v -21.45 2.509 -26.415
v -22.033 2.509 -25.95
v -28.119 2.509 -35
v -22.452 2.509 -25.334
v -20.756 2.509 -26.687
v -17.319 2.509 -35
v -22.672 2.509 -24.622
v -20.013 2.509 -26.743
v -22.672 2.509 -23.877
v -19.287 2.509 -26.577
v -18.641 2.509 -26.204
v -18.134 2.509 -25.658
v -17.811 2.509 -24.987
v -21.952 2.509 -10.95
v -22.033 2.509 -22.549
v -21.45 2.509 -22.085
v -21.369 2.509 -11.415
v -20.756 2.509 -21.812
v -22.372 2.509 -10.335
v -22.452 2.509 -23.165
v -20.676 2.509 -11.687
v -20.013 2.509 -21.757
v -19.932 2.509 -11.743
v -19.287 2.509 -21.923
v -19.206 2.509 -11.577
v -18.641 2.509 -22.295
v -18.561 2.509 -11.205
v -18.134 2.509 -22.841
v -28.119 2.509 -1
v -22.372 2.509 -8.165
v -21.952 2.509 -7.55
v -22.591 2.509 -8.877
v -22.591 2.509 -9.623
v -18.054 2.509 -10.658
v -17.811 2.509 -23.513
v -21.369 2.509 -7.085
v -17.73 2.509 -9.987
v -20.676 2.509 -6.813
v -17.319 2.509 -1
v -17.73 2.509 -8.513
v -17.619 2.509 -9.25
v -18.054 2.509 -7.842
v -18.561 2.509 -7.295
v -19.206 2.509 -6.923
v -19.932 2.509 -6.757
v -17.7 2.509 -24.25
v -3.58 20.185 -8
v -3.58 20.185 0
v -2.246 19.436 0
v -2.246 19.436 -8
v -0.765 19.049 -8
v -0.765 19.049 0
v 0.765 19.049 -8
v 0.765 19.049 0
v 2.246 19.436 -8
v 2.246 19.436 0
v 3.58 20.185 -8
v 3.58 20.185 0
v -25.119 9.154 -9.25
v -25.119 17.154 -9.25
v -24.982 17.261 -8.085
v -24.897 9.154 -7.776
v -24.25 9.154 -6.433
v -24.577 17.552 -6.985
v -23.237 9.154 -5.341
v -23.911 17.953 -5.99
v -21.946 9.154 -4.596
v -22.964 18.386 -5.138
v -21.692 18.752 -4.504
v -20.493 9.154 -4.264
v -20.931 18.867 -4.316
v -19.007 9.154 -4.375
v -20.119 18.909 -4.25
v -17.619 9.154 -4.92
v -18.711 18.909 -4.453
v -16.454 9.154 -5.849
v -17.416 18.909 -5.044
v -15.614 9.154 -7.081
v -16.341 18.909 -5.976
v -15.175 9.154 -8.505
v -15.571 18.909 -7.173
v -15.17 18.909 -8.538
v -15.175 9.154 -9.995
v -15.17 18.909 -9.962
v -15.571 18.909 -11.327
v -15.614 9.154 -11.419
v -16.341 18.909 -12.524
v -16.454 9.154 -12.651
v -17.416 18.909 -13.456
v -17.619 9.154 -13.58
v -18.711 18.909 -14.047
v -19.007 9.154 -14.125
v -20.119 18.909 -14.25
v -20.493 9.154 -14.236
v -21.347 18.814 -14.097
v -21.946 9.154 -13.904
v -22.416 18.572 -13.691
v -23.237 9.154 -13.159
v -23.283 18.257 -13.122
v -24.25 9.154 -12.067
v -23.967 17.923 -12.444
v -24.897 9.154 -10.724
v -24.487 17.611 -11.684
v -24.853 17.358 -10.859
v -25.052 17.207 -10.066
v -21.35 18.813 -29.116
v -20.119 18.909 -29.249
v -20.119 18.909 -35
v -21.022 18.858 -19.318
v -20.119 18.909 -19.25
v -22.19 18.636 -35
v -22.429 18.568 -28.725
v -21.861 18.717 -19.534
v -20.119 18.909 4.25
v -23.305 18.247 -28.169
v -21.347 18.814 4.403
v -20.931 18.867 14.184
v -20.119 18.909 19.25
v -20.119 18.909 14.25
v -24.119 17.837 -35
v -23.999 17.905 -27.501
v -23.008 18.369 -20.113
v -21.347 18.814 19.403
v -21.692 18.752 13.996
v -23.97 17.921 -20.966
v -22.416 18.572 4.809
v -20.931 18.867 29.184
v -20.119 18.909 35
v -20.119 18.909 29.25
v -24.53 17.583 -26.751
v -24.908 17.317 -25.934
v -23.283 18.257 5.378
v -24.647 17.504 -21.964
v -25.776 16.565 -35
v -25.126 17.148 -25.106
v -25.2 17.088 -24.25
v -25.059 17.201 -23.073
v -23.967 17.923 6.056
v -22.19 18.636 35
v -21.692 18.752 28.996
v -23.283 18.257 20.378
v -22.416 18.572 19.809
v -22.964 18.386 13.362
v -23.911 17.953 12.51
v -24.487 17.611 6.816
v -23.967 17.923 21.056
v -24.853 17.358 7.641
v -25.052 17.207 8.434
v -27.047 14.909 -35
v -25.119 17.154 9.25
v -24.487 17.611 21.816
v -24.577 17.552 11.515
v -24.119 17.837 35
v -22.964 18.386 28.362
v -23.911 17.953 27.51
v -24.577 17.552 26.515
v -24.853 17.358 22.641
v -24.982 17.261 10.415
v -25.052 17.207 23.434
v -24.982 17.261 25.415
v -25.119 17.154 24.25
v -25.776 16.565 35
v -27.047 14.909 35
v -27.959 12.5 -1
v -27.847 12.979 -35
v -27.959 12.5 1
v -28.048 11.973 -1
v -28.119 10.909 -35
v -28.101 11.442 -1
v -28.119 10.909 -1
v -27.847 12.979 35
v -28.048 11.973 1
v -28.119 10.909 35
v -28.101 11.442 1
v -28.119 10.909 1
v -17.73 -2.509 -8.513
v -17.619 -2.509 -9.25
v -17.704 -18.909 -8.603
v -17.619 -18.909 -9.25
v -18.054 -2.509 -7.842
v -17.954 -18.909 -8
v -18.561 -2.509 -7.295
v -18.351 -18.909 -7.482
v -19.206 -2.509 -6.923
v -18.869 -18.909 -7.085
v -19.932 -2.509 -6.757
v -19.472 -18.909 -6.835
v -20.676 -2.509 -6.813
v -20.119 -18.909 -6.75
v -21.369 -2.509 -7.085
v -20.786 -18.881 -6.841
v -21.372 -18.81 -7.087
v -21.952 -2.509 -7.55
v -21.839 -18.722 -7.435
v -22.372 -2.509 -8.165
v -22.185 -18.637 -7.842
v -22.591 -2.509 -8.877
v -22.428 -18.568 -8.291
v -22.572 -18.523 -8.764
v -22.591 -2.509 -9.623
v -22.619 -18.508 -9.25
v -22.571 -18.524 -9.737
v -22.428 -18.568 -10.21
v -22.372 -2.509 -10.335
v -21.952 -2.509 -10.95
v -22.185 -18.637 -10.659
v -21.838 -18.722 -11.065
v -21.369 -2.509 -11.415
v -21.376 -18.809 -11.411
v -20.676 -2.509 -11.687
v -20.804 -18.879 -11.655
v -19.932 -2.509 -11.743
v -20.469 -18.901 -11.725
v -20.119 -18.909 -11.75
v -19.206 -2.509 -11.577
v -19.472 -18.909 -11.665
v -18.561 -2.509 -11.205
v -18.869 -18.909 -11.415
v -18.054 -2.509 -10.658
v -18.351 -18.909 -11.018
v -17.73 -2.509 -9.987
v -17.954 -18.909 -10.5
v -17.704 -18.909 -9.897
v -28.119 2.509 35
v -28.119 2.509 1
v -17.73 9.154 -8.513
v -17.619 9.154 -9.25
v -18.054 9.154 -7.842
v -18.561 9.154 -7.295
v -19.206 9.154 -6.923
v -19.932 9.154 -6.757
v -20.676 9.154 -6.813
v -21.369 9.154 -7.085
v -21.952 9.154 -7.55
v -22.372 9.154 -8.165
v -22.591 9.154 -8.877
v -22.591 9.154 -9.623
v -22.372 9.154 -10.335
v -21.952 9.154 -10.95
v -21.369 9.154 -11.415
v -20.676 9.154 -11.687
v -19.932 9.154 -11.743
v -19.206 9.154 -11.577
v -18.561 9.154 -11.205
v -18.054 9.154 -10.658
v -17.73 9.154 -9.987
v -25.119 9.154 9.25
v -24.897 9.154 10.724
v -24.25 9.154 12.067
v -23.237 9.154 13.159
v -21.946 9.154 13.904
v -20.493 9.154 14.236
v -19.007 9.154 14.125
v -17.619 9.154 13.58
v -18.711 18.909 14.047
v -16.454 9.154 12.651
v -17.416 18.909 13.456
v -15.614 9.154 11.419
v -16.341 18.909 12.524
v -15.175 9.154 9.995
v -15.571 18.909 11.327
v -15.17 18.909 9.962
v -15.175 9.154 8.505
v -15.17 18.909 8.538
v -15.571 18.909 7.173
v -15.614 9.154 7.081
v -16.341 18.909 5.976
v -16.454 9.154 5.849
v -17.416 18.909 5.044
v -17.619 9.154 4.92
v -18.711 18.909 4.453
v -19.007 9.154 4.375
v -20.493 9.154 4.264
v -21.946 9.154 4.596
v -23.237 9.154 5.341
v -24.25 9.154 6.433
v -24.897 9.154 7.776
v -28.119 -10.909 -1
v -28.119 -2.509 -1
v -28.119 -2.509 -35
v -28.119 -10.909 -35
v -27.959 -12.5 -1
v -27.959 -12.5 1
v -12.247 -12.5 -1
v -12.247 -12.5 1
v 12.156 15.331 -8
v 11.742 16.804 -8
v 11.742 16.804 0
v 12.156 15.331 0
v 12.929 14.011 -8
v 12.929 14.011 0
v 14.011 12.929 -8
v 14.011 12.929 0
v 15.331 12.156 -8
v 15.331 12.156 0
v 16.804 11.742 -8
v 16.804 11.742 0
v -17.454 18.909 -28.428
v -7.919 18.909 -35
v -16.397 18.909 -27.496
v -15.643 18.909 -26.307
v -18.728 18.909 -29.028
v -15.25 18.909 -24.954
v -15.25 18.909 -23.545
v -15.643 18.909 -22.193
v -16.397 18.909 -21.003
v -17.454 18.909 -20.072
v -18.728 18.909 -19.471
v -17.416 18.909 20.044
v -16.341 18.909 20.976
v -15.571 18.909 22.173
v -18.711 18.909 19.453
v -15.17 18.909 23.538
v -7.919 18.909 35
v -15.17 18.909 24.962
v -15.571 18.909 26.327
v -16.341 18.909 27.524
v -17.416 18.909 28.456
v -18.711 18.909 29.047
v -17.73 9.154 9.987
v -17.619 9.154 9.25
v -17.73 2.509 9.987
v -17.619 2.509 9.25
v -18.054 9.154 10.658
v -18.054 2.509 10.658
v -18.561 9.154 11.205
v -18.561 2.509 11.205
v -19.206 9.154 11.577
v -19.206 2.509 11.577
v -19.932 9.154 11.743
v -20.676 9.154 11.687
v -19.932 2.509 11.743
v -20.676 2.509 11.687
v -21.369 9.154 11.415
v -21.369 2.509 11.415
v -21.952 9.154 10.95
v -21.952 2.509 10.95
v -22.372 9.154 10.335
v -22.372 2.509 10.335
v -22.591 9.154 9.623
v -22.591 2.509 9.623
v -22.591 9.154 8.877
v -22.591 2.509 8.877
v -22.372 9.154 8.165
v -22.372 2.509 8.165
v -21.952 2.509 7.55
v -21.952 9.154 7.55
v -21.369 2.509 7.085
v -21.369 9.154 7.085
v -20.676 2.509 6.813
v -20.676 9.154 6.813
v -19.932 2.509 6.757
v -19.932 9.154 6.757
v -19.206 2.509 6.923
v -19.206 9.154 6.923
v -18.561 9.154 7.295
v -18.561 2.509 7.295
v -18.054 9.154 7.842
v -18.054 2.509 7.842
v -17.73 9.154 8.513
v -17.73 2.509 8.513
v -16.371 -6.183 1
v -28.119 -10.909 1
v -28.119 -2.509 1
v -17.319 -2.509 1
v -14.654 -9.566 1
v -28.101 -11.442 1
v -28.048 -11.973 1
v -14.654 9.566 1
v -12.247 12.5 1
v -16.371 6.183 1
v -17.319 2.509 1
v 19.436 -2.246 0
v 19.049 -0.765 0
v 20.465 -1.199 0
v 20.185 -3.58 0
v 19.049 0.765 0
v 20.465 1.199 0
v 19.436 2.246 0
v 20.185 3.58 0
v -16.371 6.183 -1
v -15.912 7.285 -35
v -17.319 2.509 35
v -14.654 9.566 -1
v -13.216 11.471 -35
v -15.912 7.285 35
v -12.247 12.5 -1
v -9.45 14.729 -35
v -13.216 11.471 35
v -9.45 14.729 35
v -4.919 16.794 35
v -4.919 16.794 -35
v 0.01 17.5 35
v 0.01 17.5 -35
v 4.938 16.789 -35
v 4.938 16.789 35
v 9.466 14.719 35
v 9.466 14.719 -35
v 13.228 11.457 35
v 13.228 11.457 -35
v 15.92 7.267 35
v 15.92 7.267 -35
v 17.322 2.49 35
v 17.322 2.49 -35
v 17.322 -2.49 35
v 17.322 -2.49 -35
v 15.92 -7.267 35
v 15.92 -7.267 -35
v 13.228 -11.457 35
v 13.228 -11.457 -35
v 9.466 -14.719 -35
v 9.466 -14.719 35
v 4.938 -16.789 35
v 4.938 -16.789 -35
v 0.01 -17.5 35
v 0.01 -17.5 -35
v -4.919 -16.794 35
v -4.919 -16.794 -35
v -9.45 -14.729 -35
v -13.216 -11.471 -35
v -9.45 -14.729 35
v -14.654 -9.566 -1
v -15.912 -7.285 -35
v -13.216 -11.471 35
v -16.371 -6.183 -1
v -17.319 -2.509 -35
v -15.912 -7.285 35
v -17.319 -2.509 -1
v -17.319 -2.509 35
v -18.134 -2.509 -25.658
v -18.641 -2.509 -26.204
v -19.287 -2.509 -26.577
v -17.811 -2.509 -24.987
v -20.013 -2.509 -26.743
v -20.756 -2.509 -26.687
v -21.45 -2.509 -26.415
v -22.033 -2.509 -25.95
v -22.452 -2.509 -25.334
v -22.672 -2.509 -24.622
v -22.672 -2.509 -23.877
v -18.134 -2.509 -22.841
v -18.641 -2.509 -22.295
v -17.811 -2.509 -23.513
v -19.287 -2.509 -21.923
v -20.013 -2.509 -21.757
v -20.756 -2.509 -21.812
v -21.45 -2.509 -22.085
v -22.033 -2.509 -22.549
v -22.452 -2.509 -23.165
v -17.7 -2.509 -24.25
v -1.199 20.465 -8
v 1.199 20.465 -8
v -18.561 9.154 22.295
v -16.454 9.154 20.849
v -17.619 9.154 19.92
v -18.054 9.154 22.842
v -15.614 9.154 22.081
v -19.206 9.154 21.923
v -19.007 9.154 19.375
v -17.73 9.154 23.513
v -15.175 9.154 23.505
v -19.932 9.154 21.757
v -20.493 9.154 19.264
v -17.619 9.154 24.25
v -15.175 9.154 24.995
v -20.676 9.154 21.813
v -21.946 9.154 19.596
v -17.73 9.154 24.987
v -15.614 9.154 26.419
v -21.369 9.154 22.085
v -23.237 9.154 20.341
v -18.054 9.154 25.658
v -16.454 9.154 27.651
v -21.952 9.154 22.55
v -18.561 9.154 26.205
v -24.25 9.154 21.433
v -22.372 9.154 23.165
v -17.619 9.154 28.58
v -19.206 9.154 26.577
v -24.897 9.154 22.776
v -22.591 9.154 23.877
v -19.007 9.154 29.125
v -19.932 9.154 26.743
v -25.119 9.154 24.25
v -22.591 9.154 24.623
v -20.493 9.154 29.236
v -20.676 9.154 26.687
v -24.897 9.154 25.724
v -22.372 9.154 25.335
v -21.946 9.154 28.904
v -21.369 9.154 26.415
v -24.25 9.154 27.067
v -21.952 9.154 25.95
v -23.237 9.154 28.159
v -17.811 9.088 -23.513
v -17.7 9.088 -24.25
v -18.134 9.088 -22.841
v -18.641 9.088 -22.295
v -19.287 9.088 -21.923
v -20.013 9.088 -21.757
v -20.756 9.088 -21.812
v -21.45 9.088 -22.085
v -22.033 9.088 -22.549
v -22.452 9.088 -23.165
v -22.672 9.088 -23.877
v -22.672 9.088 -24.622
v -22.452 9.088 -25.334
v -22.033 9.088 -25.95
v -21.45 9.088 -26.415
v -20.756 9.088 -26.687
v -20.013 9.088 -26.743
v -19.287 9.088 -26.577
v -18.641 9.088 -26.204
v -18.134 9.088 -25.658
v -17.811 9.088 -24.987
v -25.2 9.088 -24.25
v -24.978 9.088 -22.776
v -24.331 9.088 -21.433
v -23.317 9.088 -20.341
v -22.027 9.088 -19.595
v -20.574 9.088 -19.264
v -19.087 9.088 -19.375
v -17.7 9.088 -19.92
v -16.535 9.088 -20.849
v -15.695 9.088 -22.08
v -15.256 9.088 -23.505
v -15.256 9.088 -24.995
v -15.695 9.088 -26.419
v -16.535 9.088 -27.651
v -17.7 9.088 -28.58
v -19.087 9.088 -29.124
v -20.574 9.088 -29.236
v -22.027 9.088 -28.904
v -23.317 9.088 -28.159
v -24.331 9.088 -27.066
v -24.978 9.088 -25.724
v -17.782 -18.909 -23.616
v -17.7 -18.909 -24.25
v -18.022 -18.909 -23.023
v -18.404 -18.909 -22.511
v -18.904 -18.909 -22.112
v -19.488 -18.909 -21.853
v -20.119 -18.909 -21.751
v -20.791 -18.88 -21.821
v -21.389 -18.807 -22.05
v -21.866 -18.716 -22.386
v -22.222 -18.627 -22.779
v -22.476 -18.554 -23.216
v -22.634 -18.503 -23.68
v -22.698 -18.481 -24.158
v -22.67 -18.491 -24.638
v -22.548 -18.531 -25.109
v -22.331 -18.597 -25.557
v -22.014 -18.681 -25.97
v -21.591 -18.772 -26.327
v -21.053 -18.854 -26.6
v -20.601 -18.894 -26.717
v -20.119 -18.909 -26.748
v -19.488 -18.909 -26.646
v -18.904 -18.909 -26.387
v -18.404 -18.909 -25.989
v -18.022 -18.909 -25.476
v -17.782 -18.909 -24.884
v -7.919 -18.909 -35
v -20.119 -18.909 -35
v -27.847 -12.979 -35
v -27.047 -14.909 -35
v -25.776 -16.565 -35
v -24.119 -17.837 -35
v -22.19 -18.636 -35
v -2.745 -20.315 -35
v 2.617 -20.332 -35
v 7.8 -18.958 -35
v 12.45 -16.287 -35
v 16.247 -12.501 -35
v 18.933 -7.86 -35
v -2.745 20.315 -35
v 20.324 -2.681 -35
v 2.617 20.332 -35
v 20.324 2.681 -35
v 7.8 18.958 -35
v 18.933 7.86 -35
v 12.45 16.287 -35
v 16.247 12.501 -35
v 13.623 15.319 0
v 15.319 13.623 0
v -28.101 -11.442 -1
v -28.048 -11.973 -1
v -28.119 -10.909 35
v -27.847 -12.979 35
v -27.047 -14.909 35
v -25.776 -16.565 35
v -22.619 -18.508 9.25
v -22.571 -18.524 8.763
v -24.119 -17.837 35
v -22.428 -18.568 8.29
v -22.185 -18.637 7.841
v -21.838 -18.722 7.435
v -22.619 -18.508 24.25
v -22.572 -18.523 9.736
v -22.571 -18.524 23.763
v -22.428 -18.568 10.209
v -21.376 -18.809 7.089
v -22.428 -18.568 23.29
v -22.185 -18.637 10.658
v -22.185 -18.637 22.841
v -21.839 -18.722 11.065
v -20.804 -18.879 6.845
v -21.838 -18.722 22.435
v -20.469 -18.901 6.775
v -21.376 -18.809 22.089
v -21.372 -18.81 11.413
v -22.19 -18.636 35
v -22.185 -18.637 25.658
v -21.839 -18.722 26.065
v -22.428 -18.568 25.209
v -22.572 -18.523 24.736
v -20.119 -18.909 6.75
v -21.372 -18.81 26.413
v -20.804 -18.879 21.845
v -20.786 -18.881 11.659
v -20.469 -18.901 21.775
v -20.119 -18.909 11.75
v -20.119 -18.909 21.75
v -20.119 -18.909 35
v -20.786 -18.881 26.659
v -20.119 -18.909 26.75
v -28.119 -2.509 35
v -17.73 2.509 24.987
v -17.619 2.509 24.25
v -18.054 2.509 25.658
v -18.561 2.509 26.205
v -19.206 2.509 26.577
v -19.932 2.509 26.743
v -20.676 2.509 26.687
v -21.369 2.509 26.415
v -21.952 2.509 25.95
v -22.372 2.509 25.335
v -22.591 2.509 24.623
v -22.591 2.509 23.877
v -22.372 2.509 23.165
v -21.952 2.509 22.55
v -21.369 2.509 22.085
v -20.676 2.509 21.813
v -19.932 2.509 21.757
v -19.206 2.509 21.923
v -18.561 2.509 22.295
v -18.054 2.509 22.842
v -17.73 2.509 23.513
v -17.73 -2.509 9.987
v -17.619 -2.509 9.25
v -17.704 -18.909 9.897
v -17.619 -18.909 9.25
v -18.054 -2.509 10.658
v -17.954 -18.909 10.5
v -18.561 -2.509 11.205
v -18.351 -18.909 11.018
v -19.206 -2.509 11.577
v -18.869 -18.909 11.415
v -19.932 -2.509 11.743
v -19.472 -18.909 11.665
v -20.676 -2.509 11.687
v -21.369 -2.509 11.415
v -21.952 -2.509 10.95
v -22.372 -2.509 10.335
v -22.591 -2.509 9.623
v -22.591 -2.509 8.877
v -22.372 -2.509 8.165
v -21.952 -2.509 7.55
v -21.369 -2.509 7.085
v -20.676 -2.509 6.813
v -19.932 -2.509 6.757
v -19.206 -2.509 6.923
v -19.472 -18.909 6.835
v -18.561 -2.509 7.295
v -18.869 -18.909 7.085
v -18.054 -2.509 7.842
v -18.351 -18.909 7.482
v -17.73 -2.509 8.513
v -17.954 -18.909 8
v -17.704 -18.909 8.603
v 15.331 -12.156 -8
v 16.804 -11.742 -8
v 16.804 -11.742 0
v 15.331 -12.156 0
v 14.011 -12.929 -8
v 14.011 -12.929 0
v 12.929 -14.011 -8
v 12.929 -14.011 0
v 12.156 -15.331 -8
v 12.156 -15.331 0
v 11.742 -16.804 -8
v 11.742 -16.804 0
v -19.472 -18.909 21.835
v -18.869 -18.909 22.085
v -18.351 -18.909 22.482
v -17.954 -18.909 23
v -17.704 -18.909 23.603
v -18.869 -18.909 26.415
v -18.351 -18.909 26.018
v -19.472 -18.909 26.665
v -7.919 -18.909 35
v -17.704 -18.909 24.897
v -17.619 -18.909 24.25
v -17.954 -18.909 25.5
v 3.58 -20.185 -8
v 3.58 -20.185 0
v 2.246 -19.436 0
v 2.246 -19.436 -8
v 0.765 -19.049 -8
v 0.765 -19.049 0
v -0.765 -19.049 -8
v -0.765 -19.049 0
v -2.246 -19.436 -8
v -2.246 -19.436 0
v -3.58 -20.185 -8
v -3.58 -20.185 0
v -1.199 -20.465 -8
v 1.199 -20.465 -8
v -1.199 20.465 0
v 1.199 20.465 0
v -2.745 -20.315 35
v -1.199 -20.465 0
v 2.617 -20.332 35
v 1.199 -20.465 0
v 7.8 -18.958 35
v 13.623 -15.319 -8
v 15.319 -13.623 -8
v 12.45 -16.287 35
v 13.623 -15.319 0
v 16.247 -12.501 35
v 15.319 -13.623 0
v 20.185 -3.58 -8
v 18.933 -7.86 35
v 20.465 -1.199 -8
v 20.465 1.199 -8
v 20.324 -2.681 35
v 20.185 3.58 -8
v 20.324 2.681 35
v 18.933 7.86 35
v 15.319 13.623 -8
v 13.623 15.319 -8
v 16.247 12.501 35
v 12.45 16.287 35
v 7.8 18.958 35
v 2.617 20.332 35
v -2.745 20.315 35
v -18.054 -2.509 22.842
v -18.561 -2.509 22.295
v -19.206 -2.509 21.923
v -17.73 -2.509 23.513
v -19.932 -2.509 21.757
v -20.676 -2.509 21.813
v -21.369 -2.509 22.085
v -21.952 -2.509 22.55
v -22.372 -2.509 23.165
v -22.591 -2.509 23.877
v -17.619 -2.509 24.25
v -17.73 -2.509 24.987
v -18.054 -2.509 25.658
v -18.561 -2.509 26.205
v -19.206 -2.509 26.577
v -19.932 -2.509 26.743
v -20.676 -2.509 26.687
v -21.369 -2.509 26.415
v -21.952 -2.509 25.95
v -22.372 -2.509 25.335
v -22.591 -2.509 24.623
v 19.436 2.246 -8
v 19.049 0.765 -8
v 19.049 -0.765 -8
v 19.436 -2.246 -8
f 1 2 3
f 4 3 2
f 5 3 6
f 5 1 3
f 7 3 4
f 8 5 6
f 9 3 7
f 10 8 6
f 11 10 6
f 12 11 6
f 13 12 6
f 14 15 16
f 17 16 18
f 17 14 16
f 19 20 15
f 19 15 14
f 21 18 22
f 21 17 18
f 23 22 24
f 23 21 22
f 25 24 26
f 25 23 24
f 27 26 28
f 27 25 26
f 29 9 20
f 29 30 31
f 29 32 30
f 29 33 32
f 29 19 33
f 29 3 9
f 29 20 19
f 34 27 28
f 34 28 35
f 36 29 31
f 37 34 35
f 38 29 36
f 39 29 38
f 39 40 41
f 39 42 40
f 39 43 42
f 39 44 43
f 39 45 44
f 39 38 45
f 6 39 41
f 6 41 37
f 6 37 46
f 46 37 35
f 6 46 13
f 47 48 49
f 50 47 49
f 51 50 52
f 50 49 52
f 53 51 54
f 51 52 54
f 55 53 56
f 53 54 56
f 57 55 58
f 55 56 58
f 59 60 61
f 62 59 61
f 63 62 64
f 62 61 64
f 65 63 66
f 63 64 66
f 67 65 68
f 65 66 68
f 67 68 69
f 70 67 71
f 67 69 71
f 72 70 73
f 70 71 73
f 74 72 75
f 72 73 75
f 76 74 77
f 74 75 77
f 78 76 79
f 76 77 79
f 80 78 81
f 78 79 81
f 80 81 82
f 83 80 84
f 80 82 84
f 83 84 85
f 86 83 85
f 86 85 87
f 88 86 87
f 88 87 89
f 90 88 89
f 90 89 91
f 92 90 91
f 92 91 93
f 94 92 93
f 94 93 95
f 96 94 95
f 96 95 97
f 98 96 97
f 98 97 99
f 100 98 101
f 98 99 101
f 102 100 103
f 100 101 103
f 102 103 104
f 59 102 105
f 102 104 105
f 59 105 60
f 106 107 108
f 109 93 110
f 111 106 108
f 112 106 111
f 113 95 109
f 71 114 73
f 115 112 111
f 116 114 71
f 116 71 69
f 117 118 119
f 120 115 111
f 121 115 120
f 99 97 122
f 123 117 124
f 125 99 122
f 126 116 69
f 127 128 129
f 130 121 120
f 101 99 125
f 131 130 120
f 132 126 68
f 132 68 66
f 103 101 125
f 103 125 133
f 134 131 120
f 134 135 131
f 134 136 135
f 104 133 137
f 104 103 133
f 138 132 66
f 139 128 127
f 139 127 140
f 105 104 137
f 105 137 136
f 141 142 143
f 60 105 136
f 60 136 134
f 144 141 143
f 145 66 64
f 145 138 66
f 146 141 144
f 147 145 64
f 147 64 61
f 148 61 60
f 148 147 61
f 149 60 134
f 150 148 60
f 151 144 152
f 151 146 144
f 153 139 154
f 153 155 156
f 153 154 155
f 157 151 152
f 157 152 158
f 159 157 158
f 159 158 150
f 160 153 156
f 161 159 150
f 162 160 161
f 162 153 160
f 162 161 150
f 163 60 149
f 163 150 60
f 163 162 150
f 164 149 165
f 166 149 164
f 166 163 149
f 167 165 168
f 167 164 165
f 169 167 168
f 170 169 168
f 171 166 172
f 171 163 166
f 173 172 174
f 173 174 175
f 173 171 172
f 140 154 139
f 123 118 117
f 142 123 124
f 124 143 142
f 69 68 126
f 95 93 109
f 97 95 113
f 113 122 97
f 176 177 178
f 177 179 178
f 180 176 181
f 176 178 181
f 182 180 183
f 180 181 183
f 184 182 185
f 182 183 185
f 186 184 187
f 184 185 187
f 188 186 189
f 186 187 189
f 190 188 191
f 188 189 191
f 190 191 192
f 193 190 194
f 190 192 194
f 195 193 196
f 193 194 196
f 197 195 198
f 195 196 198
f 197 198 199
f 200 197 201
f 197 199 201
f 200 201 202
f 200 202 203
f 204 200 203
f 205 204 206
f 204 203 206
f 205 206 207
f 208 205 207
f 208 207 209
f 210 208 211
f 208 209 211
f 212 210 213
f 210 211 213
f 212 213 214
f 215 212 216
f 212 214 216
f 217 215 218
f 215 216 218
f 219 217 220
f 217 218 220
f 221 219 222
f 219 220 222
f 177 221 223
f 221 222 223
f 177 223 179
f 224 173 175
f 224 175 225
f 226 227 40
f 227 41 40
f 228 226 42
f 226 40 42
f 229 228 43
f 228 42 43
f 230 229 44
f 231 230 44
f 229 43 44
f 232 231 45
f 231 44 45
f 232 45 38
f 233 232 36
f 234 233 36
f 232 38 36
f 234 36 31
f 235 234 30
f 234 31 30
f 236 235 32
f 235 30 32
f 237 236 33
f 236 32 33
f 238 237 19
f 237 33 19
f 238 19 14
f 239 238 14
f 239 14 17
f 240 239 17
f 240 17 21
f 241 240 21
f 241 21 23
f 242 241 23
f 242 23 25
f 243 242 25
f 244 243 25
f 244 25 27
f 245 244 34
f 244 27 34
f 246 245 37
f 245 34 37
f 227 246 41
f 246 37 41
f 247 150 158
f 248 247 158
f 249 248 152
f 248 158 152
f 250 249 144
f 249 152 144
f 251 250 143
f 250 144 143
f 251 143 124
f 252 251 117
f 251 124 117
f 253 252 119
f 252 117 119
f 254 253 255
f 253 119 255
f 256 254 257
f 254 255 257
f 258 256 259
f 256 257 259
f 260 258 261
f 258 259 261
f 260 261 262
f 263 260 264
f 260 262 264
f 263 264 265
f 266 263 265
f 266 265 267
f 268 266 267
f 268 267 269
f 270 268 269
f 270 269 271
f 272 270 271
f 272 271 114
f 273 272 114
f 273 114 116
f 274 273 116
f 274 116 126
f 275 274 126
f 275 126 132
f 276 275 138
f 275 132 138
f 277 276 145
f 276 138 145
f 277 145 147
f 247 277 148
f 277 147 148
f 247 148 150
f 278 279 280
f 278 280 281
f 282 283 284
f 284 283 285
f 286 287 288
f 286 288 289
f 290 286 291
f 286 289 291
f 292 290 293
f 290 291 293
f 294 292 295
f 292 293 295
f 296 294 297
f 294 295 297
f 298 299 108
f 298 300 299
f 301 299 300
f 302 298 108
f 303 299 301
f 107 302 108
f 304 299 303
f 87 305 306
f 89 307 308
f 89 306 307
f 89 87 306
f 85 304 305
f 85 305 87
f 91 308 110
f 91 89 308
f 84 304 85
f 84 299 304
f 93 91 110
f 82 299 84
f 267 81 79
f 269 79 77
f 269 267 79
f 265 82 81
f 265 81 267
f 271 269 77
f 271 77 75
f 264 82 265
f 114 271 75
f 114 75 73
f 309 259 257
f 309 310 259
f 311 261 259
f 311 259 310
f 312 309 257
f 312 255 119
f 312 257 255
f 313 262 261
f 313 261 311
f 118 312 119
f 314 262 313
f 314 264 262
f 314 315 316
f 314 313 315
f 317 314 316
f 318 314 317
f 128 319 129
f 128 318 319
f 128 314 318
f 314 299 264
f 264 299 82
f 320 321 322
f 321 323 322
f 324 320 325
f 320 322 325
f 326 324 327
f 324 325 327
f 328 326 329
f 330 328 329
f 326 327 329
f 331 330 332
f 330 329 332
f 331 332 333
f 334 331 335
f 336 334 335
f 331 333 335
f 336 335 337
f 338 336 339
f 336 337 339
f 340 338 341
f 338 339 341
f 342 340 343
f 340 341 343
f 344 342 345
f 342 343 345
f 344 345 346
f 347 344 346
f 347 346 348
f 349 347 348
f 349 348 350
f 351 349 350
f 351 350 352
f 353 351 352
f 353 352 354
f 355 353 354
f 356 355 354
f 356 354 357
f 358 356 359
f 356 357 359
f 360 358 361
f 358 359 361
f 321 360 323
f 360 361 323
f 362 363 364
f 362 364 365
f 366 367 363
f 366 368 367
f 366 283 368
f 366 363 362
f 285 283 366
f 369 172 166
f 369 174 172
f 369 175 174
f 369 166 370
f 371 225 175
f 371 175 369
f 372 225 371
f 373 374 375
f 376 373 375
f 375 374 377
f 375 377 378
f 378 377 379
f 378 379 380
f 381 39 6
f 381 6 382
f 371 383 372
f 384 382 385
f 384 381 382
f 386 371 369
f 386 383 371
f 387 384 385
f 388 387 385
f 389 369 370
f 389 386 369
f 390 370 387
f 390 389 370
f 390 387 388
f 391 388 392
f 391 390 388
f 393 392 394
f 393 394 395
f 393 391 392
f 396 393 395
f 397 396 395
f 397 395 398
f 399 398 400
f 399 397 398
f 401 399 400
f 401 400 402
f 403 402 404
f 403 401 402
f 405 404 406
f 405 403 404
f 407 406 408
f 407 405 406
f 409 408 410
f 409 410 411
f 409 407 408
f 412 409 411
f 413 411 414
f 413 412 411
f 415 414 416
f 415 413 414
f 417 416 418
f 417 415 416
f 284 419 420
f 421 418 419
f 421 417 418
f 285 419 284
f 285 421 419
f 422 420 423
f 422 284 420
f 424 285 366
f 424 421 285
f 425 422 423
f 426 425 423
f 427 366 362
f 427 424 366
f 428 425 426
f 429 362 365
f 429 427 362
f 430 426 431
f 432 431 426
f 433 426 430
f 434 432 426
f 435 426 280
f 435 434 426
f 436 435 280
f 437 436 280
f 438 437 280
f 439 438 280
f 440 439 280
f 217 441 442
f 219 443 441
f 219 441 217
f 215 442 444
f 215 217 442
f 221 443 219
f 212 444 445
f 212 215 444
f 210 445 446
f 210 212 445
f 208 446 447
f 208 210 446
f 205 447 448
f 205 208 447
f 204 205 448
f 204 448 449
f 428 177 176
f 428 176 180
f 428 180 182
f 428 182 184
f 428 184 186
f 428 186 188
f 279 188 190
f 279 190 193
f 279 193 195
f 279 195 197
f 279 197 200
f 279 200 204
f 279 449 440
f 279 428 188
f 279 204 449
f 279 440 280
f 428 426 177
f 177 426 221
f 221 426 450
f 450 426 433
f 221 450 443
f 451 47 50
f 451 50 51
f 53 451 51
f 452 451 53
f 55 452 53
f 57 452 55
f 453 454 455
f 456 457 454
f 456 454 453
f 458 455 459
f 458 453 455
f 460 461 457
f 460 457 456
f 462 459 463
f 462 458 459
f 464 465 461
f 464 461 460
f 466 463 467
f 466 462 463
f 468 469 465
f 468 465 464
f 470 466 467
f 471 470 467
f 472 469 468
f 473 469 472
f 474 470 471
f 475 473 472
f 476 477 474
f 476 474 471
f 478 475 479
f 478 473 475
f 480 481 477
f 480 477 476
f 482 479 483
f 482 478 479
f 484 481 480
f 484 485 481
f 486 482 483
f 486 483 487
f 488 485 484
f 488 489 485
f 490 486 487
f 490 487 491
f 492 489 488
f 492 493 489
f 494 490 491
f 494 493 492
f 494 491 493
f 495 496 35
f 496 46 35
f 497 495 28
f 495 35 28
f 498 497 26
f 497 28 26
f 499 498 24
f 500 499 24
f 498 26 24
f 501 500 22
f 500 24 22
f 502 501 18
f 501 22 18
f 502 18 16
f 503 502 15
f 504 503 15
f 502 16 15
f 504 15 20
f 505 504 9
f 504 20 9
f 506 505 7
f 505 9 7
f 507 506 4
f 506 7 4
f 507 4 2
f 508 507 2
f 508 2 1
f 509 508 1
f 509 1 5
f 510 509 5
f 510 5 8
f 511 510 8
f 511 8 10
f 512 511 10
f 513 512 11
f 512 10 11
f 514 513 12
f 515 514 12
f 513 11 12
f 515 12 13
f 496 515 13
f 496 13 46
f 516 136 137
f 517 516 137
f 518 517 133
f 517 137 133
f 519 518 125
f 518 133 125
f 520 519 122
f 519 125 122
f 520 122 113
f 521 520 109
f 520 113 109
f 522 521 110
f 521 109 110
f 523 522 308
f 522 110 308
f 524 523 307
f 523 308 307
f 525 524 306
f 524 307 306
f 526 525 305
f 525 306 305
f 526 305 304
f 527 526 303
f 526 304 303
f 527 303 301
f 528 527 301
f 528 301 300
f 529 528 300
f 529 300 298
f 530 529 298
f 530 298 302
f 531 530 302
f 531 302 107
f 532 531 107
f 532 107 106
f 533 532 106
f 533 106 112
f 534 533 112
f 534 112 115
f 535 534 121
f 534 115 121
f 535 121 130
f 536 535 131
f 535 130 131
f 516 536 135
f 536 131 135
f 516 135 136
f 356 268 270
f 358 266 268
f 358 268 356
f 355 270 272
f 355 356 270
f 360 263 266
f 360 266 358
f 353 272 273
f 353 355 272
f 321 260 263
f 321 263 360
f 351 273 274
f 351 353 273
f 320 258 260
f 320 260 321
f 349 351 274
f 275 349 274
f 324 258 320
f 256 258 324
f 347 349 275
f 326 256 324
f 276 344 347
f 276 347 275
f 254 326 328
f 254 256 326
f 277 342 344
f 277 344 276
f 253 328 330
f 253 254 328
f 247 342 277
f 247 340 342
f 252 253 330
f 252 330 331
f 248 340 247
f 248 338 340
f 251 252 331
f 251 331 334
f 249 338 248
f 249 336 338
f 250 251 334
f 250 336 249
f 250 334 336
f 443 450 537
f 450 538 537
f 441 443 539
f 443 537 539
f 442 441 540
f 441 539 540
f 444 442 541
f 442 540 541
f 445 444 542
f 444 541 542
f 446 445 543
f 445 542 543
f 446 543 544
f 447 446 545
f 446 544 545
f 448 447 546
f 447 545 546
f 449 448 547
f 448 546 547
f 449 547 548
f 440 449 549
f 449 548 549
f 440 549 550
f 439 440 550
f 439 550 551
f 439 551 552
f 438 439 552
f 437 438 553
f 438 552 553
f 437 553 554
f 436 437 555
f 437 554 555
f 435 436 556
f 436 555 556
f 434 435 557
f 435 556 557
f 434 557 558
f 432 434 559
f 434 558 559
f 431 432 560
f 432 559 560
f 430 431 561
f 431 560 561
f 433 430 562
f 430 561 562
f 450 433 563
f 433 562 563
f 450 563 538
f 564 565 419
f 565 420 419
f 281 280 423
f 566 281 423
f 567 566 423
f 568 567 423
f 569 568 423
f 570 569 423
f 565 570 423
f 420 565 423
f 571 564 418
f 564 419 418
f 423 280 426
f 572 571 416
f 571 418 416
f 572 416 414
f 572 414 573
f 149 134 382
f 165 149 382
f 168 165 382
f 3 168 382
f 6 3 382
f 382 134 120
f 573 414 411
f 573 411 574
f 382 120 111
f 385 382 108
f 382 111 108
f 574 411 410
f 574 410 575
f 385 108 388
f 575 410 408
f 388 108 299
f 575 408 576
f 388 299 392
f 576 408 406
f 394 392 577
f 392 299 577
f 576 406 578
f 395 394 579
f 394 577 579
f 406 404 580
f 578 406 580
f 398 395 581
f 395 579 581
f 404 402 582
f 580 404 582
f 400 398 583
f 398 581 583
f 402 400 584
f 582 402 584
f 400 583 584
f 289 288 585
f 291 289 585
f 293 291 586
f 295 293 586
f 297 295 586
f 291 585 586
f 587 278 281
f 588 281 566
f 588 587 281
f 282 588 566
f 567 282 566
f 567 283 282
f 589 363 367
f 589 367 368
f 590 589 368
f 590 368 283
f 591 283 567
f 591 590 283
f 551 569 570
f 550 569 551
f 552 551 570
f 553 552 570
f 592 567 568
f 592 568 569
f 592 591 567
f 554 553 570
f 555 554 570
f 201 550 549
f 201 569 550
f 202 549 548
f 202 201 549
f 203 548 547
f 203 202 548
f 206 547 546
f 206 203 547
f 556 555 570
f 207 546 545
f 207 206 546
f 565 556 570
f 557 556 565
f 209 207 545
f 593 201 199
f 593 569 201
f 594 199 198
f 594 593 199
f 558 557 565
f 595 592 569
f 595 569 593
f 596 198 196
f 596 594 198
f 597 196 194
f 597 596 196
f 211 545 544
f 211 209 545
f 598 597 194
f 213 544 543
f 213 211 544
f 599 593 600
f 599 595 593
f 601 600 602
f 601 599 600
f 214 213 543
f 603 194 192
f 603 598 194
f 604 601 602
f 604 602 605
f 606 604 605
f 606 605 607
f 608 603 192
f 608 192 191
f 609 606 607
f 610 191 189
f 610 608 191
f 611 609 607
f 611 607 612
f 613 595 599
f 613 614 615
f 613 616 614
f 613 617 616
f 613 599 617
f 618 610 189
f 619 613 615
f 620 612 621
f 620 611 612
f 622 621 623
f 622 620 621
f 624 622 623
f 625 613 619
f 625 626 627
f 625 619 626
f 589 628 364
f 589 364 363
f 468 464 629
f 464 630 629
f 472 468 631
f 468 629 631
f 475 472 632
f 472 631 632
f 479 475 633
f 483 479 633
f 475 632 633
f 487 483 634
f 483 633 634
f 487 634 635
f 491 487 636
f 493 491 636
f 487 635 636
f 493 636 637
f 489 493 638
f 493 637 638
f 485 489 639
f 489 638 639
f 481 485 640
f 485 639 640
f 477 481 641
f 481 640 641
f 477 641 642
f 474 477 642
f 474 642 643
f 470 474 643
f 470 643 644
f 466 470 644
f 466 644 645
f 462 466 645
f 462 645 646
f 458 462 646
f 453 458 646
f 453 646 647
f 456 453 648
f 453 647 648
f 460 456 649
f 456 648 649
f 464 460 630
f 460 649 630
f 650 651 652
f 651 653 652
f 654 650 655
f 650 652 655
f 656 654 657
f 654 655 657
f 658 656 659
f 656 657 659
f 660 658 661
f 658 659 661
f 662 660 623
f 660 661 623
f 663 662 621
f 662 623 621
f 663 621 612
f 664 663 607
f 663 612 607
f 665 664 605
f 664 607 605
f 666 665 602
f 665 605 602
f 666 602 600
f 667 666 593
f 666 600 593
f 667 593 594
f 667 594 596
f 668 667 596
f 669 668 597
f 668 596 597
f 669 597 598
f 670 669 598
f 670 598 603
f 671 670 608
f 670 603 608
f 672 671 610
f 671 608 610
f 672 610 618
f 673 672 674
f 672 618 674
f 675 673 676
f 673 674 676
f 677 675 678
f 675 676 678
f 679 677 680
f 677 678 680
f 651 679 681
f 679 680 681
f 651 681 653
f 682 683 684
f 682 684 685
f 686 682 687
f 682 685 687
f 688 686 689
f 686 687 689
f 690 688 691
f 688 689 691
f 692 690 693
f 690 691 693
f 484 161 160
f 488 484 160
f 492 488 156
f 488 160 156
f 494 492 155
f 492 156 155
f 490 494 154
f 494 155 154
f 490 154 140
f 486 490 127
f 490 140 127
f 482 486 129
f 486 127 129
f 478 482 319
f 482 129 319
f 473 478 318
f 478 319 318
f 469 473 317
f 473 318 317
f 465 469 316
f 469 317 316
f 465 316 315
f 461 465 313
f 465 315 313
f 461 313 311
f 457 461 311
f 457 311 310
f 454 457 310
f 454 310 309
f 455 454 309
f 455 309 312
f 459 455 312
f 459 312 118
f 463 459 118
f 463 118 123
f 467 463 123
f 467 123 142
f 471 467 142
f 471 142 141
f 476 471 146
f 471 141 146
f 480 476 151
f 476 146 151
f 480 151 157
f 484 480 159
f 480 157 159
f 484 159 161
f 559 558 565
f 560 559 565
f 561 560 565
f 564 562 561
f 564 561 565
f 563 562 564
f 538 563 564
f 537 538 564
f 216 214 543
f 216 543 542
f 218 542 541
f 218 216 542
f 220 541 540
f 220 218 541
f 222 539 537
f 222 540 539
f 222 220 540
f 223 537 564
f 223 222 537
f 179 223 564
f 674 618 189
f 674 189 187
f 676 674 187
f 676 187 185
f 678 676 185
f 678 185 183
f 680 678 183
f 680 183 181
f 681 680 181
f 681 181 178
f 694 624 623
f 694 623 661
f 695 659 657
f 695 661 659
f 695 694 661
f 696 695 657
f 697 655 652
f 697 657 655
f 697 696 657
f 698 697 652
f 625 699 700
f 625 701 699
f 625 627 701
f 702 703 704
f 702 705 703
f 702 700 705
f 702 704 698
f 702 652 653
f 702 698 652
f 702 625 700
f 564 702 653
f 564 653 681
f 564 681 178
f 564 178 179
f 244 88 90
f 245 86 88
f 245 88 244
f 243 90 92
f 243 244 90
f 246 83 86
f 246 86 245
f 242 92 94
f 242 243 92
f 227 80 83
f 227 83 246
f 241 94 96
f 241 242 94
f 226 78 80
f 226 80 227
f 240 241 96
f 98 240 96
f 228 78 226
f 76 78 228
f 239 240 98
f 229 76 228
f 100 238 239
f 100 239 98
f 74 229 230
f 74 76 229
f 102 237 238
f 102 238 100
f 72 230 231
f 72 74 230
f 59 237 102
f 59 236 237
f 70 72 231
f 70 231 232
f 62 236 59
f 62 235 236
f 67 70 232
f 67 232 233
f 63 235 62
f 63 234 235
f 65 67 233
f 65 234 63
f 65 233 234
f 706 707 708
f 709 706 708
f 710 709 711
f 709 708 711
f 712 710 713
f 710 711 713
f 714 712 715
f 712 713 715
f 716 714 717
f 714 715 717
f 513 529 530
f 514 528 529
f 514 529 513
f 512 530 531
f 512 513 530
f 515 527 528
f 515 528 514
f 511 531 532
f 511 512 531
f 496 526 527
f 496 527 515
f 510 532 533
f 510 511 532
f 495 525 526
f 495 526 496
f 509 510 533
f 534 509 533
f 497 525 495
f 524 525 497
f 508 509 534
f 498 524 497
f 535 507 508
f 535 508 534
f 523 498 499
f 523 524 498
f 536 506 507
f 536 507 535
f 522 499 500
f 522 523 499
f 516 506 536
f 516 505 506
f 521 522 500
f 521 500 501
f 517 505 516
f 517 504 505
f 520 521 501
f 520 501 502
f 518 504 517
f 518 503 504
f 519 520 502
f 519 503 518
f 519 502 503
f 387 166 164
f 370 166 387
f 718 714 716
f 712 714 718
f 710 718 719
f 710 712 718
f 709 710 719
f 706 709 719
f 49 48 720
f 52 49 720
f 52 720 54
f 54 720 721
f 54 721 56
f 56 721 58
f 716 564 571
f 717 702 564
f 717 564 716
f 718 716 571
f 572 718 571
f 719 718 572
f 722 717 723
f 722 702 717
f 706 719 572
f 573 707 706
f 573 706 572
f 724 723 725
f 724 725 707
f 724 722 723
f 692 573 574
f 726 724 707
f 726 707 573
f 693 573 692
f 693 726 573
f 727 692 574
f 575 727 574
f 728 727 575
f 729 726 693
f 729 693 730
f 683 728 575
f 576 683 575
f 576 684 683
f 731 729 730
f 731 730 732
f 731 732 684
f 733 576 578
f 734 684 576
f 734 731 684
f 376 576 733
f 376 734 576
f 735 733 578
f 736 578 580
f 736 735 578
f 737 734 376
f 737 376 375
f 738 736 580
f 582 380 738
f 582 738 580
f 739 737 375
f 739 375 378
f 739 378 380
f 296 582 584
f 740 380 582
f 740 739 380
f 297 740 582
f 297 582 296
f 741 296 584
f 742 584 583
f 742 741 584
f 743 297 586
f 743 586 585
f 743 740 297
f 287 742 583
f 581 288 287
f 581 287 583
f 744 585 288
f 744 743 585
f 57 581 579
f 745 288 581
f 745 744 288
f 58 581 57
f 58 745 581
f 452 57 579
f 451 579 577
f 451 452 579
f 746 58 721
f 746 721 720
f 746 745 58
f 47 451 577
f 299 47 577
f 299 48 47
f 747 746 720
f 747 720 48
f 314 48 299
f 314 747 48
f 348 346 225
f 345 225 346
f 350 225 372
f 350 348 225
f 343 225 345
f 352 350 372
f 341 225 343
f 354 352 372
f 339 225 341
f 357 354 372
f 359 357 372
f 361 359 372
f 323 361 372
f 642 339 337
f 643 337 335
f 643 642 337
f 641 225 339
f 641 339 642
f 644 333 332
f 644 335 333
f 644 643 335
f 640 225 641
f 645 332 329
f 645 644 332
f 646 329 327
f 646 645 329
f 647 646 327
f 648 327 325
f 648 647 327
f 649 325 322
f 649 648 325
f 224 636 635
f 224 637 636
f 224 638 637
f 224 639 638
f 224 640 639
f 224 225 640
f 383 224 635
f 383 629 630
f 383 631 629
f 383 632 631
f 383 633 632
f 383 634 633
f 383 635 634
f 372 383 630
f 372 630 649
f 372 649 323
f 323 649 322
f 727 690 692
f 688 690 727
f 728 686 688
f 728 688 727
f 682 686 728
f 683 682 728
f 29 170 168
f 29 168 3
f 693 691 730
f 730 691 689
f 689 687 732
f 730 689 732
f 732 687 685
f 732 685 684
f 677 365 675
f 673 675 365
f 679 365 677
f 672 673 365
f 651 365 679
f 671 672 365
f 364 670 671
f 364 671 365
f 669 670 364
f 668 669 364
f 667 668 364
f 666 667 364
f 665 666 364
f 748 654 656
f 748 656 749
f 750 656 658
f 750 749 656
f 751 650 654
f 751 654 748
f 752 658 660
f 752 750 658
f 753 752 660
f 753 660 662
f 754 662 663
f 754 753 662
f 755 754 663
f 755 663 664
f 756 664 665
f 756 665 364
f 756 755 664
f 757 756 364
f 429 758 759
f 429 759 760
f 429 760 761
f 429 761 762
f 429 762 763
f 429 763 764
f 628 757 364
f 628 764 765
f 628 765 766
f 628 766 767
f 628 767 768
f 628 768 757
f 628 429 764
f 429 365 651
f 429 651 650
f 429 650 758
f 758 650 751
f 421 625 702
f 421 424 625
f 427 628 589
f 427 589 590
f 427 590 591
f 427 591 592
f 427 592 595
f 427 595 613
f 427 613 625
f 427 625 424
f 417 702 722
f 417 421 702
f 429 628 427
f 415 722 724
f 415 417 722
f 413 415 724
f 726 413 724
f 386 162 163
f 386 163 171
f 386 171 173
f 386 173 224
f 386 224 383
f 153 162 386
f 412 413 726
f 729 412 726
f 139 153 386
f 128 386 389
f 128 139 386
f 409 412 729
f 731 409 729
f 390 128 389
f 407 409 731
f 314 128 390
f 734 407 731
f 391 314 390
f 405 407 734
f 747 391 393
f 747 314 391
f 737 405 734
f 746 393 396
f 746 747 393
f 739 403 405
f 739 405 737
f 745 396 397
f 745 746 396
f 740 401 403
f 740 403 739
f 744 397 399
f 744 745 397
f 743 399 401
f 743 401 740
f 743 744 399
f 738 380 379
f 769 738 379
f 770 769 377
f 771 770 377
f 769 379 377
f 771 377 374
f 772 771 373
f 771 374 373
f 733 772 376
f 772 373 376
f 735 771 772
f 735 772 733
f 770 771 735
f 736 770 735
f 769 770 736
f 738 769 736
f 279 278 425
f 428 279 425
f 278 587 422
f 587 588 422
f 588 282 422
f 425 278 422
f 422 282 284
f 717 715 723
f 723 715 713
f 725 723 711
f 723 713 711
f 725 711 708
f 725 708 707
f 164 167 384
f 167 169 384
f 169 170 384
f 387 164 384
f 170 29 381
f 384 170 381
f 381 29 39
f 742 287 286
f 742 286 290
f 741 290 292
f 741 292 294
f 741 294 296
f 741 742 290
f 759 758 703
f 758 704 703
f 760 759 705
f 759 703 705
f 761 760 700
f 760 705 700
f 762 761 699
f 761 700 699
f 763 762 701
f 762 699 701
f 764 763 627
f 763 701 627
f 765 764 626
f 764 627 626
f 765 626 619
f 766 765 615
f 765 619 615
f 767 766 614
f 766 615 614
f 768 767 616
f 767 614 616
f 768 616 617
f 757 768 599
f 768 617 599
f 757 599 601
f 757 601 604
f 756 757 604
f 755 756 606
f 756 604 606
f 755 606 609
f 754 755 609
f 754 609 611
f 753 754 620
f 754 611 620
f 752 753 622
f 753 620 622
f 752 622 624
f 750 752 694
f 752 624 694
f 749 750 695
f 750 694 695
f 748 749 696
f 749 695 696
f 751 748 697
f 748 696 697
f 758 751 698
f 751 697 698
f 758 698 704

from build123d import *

# Parameters (mm, degrees)
F1_DEPTH       = 35
F3_D           = 5
F3_START       = 1.7550021
F3_START_2     = 1.8205079
F3_CBORE_D     = 10
F3_CBORE_DEPTH = 8
F4_W           = 22.4
F4_H           = 2
F5_DEPTH       = 12.5
F6_R           = 6
F7_DEPTH       = 8


with BuildPart() as f1:
    # F0 (on Top) → F1 (new body, symmetric)
    with BuildSketch(Plane.XY):
        with BuildLine():
            ThreePointArc((-17.3192642082, 2.5086026559), (17.5, 0), (-17.3192642082, -2.5086026559))
            Line((-17.3192642082, -2.5086026559), (-28.1192642082, -2.5086026559))
            Line((-28.1192642082, -2.5086026559), (-28.1192642082, -10.9086026559))
            ThreePointArc((-28.1192642082, -10.9086026559), (-25.7761184577, -16.5654569054), (-20.1192642082, -18.9086026559))
            Line((-20.1192642082, -18.9086026559), (-7.9192642082, -18.9086026559))
            ThreePointArc((-7.9192642082, -18.9086026559), (20.5, 0), (-7.9192642082, 18.9086026559))
            Line((-7.9192642082, 18.9086026559), (-20.1192642082, 18.9086026559))
            ThreePointArc((-20.1192642082, 18.9086026559), (-25.7761184577, 16.5654569054), (-28.1192642082, 10.9086026559))
            Line((-28.1192642082, 10.9086026559), (-28.1192642082, 2.5086026559))
            Line((-28.1192642082, 2.5086026559), (-17.3192642082, 2.5086026559))
        make_face()
    extrude(amount=F1_DEPTH, both=True)

    # F3 (through all)
    # its depths count from where the whole tool has entered the part; down to there all is cleared
    with Locations(Plane(origin=(0, 18.9086026559, 0), x_dir=(-1, 0, 0), z_dir=(0, 1, 0))):
        with Locations((20.1192642082, 24.25, -F3_START), (20.1192642082, 9.25, -F3_START), (20.1192642082, -9.25, -F3_START), (20.2, -24.2497827228, -F3_START_2)):
            CounterBoreHole(F3_D / 2, F3_CBORE_D / 2, F3_CBORE_DEPTH)

    # F4 (on Front) → F5 (cut, symmetric)
    with BuildSketch(Plane.XZ):
        with Locations((-16.9192642082, 0)):
            Rectangle(F4_W, F4_H)
    extrude(amount=F5_DEPTH, both=True, mode=Mode.SUBTRACT)

    # F6 (on Top) → F7 (cut)
    with BuildSketch(Plane.XY):
        with Locations((0, -25)):
            Circle(F6_R)
        with Locations((17.6776695297, -17.6776695297)):
            Circle(F6_R)
        with Locations((25, 0)):
            Circle(F6_R)
        with Locations((17.6776695297, 17.6776695297)):
            Circle(F6_R)
        with Locations((0, 25)):
            Circle(F6_R)
    extrude(amount=-F7_DEPTH, mode=Mode.SUBTRACT)


solid = f1.part
